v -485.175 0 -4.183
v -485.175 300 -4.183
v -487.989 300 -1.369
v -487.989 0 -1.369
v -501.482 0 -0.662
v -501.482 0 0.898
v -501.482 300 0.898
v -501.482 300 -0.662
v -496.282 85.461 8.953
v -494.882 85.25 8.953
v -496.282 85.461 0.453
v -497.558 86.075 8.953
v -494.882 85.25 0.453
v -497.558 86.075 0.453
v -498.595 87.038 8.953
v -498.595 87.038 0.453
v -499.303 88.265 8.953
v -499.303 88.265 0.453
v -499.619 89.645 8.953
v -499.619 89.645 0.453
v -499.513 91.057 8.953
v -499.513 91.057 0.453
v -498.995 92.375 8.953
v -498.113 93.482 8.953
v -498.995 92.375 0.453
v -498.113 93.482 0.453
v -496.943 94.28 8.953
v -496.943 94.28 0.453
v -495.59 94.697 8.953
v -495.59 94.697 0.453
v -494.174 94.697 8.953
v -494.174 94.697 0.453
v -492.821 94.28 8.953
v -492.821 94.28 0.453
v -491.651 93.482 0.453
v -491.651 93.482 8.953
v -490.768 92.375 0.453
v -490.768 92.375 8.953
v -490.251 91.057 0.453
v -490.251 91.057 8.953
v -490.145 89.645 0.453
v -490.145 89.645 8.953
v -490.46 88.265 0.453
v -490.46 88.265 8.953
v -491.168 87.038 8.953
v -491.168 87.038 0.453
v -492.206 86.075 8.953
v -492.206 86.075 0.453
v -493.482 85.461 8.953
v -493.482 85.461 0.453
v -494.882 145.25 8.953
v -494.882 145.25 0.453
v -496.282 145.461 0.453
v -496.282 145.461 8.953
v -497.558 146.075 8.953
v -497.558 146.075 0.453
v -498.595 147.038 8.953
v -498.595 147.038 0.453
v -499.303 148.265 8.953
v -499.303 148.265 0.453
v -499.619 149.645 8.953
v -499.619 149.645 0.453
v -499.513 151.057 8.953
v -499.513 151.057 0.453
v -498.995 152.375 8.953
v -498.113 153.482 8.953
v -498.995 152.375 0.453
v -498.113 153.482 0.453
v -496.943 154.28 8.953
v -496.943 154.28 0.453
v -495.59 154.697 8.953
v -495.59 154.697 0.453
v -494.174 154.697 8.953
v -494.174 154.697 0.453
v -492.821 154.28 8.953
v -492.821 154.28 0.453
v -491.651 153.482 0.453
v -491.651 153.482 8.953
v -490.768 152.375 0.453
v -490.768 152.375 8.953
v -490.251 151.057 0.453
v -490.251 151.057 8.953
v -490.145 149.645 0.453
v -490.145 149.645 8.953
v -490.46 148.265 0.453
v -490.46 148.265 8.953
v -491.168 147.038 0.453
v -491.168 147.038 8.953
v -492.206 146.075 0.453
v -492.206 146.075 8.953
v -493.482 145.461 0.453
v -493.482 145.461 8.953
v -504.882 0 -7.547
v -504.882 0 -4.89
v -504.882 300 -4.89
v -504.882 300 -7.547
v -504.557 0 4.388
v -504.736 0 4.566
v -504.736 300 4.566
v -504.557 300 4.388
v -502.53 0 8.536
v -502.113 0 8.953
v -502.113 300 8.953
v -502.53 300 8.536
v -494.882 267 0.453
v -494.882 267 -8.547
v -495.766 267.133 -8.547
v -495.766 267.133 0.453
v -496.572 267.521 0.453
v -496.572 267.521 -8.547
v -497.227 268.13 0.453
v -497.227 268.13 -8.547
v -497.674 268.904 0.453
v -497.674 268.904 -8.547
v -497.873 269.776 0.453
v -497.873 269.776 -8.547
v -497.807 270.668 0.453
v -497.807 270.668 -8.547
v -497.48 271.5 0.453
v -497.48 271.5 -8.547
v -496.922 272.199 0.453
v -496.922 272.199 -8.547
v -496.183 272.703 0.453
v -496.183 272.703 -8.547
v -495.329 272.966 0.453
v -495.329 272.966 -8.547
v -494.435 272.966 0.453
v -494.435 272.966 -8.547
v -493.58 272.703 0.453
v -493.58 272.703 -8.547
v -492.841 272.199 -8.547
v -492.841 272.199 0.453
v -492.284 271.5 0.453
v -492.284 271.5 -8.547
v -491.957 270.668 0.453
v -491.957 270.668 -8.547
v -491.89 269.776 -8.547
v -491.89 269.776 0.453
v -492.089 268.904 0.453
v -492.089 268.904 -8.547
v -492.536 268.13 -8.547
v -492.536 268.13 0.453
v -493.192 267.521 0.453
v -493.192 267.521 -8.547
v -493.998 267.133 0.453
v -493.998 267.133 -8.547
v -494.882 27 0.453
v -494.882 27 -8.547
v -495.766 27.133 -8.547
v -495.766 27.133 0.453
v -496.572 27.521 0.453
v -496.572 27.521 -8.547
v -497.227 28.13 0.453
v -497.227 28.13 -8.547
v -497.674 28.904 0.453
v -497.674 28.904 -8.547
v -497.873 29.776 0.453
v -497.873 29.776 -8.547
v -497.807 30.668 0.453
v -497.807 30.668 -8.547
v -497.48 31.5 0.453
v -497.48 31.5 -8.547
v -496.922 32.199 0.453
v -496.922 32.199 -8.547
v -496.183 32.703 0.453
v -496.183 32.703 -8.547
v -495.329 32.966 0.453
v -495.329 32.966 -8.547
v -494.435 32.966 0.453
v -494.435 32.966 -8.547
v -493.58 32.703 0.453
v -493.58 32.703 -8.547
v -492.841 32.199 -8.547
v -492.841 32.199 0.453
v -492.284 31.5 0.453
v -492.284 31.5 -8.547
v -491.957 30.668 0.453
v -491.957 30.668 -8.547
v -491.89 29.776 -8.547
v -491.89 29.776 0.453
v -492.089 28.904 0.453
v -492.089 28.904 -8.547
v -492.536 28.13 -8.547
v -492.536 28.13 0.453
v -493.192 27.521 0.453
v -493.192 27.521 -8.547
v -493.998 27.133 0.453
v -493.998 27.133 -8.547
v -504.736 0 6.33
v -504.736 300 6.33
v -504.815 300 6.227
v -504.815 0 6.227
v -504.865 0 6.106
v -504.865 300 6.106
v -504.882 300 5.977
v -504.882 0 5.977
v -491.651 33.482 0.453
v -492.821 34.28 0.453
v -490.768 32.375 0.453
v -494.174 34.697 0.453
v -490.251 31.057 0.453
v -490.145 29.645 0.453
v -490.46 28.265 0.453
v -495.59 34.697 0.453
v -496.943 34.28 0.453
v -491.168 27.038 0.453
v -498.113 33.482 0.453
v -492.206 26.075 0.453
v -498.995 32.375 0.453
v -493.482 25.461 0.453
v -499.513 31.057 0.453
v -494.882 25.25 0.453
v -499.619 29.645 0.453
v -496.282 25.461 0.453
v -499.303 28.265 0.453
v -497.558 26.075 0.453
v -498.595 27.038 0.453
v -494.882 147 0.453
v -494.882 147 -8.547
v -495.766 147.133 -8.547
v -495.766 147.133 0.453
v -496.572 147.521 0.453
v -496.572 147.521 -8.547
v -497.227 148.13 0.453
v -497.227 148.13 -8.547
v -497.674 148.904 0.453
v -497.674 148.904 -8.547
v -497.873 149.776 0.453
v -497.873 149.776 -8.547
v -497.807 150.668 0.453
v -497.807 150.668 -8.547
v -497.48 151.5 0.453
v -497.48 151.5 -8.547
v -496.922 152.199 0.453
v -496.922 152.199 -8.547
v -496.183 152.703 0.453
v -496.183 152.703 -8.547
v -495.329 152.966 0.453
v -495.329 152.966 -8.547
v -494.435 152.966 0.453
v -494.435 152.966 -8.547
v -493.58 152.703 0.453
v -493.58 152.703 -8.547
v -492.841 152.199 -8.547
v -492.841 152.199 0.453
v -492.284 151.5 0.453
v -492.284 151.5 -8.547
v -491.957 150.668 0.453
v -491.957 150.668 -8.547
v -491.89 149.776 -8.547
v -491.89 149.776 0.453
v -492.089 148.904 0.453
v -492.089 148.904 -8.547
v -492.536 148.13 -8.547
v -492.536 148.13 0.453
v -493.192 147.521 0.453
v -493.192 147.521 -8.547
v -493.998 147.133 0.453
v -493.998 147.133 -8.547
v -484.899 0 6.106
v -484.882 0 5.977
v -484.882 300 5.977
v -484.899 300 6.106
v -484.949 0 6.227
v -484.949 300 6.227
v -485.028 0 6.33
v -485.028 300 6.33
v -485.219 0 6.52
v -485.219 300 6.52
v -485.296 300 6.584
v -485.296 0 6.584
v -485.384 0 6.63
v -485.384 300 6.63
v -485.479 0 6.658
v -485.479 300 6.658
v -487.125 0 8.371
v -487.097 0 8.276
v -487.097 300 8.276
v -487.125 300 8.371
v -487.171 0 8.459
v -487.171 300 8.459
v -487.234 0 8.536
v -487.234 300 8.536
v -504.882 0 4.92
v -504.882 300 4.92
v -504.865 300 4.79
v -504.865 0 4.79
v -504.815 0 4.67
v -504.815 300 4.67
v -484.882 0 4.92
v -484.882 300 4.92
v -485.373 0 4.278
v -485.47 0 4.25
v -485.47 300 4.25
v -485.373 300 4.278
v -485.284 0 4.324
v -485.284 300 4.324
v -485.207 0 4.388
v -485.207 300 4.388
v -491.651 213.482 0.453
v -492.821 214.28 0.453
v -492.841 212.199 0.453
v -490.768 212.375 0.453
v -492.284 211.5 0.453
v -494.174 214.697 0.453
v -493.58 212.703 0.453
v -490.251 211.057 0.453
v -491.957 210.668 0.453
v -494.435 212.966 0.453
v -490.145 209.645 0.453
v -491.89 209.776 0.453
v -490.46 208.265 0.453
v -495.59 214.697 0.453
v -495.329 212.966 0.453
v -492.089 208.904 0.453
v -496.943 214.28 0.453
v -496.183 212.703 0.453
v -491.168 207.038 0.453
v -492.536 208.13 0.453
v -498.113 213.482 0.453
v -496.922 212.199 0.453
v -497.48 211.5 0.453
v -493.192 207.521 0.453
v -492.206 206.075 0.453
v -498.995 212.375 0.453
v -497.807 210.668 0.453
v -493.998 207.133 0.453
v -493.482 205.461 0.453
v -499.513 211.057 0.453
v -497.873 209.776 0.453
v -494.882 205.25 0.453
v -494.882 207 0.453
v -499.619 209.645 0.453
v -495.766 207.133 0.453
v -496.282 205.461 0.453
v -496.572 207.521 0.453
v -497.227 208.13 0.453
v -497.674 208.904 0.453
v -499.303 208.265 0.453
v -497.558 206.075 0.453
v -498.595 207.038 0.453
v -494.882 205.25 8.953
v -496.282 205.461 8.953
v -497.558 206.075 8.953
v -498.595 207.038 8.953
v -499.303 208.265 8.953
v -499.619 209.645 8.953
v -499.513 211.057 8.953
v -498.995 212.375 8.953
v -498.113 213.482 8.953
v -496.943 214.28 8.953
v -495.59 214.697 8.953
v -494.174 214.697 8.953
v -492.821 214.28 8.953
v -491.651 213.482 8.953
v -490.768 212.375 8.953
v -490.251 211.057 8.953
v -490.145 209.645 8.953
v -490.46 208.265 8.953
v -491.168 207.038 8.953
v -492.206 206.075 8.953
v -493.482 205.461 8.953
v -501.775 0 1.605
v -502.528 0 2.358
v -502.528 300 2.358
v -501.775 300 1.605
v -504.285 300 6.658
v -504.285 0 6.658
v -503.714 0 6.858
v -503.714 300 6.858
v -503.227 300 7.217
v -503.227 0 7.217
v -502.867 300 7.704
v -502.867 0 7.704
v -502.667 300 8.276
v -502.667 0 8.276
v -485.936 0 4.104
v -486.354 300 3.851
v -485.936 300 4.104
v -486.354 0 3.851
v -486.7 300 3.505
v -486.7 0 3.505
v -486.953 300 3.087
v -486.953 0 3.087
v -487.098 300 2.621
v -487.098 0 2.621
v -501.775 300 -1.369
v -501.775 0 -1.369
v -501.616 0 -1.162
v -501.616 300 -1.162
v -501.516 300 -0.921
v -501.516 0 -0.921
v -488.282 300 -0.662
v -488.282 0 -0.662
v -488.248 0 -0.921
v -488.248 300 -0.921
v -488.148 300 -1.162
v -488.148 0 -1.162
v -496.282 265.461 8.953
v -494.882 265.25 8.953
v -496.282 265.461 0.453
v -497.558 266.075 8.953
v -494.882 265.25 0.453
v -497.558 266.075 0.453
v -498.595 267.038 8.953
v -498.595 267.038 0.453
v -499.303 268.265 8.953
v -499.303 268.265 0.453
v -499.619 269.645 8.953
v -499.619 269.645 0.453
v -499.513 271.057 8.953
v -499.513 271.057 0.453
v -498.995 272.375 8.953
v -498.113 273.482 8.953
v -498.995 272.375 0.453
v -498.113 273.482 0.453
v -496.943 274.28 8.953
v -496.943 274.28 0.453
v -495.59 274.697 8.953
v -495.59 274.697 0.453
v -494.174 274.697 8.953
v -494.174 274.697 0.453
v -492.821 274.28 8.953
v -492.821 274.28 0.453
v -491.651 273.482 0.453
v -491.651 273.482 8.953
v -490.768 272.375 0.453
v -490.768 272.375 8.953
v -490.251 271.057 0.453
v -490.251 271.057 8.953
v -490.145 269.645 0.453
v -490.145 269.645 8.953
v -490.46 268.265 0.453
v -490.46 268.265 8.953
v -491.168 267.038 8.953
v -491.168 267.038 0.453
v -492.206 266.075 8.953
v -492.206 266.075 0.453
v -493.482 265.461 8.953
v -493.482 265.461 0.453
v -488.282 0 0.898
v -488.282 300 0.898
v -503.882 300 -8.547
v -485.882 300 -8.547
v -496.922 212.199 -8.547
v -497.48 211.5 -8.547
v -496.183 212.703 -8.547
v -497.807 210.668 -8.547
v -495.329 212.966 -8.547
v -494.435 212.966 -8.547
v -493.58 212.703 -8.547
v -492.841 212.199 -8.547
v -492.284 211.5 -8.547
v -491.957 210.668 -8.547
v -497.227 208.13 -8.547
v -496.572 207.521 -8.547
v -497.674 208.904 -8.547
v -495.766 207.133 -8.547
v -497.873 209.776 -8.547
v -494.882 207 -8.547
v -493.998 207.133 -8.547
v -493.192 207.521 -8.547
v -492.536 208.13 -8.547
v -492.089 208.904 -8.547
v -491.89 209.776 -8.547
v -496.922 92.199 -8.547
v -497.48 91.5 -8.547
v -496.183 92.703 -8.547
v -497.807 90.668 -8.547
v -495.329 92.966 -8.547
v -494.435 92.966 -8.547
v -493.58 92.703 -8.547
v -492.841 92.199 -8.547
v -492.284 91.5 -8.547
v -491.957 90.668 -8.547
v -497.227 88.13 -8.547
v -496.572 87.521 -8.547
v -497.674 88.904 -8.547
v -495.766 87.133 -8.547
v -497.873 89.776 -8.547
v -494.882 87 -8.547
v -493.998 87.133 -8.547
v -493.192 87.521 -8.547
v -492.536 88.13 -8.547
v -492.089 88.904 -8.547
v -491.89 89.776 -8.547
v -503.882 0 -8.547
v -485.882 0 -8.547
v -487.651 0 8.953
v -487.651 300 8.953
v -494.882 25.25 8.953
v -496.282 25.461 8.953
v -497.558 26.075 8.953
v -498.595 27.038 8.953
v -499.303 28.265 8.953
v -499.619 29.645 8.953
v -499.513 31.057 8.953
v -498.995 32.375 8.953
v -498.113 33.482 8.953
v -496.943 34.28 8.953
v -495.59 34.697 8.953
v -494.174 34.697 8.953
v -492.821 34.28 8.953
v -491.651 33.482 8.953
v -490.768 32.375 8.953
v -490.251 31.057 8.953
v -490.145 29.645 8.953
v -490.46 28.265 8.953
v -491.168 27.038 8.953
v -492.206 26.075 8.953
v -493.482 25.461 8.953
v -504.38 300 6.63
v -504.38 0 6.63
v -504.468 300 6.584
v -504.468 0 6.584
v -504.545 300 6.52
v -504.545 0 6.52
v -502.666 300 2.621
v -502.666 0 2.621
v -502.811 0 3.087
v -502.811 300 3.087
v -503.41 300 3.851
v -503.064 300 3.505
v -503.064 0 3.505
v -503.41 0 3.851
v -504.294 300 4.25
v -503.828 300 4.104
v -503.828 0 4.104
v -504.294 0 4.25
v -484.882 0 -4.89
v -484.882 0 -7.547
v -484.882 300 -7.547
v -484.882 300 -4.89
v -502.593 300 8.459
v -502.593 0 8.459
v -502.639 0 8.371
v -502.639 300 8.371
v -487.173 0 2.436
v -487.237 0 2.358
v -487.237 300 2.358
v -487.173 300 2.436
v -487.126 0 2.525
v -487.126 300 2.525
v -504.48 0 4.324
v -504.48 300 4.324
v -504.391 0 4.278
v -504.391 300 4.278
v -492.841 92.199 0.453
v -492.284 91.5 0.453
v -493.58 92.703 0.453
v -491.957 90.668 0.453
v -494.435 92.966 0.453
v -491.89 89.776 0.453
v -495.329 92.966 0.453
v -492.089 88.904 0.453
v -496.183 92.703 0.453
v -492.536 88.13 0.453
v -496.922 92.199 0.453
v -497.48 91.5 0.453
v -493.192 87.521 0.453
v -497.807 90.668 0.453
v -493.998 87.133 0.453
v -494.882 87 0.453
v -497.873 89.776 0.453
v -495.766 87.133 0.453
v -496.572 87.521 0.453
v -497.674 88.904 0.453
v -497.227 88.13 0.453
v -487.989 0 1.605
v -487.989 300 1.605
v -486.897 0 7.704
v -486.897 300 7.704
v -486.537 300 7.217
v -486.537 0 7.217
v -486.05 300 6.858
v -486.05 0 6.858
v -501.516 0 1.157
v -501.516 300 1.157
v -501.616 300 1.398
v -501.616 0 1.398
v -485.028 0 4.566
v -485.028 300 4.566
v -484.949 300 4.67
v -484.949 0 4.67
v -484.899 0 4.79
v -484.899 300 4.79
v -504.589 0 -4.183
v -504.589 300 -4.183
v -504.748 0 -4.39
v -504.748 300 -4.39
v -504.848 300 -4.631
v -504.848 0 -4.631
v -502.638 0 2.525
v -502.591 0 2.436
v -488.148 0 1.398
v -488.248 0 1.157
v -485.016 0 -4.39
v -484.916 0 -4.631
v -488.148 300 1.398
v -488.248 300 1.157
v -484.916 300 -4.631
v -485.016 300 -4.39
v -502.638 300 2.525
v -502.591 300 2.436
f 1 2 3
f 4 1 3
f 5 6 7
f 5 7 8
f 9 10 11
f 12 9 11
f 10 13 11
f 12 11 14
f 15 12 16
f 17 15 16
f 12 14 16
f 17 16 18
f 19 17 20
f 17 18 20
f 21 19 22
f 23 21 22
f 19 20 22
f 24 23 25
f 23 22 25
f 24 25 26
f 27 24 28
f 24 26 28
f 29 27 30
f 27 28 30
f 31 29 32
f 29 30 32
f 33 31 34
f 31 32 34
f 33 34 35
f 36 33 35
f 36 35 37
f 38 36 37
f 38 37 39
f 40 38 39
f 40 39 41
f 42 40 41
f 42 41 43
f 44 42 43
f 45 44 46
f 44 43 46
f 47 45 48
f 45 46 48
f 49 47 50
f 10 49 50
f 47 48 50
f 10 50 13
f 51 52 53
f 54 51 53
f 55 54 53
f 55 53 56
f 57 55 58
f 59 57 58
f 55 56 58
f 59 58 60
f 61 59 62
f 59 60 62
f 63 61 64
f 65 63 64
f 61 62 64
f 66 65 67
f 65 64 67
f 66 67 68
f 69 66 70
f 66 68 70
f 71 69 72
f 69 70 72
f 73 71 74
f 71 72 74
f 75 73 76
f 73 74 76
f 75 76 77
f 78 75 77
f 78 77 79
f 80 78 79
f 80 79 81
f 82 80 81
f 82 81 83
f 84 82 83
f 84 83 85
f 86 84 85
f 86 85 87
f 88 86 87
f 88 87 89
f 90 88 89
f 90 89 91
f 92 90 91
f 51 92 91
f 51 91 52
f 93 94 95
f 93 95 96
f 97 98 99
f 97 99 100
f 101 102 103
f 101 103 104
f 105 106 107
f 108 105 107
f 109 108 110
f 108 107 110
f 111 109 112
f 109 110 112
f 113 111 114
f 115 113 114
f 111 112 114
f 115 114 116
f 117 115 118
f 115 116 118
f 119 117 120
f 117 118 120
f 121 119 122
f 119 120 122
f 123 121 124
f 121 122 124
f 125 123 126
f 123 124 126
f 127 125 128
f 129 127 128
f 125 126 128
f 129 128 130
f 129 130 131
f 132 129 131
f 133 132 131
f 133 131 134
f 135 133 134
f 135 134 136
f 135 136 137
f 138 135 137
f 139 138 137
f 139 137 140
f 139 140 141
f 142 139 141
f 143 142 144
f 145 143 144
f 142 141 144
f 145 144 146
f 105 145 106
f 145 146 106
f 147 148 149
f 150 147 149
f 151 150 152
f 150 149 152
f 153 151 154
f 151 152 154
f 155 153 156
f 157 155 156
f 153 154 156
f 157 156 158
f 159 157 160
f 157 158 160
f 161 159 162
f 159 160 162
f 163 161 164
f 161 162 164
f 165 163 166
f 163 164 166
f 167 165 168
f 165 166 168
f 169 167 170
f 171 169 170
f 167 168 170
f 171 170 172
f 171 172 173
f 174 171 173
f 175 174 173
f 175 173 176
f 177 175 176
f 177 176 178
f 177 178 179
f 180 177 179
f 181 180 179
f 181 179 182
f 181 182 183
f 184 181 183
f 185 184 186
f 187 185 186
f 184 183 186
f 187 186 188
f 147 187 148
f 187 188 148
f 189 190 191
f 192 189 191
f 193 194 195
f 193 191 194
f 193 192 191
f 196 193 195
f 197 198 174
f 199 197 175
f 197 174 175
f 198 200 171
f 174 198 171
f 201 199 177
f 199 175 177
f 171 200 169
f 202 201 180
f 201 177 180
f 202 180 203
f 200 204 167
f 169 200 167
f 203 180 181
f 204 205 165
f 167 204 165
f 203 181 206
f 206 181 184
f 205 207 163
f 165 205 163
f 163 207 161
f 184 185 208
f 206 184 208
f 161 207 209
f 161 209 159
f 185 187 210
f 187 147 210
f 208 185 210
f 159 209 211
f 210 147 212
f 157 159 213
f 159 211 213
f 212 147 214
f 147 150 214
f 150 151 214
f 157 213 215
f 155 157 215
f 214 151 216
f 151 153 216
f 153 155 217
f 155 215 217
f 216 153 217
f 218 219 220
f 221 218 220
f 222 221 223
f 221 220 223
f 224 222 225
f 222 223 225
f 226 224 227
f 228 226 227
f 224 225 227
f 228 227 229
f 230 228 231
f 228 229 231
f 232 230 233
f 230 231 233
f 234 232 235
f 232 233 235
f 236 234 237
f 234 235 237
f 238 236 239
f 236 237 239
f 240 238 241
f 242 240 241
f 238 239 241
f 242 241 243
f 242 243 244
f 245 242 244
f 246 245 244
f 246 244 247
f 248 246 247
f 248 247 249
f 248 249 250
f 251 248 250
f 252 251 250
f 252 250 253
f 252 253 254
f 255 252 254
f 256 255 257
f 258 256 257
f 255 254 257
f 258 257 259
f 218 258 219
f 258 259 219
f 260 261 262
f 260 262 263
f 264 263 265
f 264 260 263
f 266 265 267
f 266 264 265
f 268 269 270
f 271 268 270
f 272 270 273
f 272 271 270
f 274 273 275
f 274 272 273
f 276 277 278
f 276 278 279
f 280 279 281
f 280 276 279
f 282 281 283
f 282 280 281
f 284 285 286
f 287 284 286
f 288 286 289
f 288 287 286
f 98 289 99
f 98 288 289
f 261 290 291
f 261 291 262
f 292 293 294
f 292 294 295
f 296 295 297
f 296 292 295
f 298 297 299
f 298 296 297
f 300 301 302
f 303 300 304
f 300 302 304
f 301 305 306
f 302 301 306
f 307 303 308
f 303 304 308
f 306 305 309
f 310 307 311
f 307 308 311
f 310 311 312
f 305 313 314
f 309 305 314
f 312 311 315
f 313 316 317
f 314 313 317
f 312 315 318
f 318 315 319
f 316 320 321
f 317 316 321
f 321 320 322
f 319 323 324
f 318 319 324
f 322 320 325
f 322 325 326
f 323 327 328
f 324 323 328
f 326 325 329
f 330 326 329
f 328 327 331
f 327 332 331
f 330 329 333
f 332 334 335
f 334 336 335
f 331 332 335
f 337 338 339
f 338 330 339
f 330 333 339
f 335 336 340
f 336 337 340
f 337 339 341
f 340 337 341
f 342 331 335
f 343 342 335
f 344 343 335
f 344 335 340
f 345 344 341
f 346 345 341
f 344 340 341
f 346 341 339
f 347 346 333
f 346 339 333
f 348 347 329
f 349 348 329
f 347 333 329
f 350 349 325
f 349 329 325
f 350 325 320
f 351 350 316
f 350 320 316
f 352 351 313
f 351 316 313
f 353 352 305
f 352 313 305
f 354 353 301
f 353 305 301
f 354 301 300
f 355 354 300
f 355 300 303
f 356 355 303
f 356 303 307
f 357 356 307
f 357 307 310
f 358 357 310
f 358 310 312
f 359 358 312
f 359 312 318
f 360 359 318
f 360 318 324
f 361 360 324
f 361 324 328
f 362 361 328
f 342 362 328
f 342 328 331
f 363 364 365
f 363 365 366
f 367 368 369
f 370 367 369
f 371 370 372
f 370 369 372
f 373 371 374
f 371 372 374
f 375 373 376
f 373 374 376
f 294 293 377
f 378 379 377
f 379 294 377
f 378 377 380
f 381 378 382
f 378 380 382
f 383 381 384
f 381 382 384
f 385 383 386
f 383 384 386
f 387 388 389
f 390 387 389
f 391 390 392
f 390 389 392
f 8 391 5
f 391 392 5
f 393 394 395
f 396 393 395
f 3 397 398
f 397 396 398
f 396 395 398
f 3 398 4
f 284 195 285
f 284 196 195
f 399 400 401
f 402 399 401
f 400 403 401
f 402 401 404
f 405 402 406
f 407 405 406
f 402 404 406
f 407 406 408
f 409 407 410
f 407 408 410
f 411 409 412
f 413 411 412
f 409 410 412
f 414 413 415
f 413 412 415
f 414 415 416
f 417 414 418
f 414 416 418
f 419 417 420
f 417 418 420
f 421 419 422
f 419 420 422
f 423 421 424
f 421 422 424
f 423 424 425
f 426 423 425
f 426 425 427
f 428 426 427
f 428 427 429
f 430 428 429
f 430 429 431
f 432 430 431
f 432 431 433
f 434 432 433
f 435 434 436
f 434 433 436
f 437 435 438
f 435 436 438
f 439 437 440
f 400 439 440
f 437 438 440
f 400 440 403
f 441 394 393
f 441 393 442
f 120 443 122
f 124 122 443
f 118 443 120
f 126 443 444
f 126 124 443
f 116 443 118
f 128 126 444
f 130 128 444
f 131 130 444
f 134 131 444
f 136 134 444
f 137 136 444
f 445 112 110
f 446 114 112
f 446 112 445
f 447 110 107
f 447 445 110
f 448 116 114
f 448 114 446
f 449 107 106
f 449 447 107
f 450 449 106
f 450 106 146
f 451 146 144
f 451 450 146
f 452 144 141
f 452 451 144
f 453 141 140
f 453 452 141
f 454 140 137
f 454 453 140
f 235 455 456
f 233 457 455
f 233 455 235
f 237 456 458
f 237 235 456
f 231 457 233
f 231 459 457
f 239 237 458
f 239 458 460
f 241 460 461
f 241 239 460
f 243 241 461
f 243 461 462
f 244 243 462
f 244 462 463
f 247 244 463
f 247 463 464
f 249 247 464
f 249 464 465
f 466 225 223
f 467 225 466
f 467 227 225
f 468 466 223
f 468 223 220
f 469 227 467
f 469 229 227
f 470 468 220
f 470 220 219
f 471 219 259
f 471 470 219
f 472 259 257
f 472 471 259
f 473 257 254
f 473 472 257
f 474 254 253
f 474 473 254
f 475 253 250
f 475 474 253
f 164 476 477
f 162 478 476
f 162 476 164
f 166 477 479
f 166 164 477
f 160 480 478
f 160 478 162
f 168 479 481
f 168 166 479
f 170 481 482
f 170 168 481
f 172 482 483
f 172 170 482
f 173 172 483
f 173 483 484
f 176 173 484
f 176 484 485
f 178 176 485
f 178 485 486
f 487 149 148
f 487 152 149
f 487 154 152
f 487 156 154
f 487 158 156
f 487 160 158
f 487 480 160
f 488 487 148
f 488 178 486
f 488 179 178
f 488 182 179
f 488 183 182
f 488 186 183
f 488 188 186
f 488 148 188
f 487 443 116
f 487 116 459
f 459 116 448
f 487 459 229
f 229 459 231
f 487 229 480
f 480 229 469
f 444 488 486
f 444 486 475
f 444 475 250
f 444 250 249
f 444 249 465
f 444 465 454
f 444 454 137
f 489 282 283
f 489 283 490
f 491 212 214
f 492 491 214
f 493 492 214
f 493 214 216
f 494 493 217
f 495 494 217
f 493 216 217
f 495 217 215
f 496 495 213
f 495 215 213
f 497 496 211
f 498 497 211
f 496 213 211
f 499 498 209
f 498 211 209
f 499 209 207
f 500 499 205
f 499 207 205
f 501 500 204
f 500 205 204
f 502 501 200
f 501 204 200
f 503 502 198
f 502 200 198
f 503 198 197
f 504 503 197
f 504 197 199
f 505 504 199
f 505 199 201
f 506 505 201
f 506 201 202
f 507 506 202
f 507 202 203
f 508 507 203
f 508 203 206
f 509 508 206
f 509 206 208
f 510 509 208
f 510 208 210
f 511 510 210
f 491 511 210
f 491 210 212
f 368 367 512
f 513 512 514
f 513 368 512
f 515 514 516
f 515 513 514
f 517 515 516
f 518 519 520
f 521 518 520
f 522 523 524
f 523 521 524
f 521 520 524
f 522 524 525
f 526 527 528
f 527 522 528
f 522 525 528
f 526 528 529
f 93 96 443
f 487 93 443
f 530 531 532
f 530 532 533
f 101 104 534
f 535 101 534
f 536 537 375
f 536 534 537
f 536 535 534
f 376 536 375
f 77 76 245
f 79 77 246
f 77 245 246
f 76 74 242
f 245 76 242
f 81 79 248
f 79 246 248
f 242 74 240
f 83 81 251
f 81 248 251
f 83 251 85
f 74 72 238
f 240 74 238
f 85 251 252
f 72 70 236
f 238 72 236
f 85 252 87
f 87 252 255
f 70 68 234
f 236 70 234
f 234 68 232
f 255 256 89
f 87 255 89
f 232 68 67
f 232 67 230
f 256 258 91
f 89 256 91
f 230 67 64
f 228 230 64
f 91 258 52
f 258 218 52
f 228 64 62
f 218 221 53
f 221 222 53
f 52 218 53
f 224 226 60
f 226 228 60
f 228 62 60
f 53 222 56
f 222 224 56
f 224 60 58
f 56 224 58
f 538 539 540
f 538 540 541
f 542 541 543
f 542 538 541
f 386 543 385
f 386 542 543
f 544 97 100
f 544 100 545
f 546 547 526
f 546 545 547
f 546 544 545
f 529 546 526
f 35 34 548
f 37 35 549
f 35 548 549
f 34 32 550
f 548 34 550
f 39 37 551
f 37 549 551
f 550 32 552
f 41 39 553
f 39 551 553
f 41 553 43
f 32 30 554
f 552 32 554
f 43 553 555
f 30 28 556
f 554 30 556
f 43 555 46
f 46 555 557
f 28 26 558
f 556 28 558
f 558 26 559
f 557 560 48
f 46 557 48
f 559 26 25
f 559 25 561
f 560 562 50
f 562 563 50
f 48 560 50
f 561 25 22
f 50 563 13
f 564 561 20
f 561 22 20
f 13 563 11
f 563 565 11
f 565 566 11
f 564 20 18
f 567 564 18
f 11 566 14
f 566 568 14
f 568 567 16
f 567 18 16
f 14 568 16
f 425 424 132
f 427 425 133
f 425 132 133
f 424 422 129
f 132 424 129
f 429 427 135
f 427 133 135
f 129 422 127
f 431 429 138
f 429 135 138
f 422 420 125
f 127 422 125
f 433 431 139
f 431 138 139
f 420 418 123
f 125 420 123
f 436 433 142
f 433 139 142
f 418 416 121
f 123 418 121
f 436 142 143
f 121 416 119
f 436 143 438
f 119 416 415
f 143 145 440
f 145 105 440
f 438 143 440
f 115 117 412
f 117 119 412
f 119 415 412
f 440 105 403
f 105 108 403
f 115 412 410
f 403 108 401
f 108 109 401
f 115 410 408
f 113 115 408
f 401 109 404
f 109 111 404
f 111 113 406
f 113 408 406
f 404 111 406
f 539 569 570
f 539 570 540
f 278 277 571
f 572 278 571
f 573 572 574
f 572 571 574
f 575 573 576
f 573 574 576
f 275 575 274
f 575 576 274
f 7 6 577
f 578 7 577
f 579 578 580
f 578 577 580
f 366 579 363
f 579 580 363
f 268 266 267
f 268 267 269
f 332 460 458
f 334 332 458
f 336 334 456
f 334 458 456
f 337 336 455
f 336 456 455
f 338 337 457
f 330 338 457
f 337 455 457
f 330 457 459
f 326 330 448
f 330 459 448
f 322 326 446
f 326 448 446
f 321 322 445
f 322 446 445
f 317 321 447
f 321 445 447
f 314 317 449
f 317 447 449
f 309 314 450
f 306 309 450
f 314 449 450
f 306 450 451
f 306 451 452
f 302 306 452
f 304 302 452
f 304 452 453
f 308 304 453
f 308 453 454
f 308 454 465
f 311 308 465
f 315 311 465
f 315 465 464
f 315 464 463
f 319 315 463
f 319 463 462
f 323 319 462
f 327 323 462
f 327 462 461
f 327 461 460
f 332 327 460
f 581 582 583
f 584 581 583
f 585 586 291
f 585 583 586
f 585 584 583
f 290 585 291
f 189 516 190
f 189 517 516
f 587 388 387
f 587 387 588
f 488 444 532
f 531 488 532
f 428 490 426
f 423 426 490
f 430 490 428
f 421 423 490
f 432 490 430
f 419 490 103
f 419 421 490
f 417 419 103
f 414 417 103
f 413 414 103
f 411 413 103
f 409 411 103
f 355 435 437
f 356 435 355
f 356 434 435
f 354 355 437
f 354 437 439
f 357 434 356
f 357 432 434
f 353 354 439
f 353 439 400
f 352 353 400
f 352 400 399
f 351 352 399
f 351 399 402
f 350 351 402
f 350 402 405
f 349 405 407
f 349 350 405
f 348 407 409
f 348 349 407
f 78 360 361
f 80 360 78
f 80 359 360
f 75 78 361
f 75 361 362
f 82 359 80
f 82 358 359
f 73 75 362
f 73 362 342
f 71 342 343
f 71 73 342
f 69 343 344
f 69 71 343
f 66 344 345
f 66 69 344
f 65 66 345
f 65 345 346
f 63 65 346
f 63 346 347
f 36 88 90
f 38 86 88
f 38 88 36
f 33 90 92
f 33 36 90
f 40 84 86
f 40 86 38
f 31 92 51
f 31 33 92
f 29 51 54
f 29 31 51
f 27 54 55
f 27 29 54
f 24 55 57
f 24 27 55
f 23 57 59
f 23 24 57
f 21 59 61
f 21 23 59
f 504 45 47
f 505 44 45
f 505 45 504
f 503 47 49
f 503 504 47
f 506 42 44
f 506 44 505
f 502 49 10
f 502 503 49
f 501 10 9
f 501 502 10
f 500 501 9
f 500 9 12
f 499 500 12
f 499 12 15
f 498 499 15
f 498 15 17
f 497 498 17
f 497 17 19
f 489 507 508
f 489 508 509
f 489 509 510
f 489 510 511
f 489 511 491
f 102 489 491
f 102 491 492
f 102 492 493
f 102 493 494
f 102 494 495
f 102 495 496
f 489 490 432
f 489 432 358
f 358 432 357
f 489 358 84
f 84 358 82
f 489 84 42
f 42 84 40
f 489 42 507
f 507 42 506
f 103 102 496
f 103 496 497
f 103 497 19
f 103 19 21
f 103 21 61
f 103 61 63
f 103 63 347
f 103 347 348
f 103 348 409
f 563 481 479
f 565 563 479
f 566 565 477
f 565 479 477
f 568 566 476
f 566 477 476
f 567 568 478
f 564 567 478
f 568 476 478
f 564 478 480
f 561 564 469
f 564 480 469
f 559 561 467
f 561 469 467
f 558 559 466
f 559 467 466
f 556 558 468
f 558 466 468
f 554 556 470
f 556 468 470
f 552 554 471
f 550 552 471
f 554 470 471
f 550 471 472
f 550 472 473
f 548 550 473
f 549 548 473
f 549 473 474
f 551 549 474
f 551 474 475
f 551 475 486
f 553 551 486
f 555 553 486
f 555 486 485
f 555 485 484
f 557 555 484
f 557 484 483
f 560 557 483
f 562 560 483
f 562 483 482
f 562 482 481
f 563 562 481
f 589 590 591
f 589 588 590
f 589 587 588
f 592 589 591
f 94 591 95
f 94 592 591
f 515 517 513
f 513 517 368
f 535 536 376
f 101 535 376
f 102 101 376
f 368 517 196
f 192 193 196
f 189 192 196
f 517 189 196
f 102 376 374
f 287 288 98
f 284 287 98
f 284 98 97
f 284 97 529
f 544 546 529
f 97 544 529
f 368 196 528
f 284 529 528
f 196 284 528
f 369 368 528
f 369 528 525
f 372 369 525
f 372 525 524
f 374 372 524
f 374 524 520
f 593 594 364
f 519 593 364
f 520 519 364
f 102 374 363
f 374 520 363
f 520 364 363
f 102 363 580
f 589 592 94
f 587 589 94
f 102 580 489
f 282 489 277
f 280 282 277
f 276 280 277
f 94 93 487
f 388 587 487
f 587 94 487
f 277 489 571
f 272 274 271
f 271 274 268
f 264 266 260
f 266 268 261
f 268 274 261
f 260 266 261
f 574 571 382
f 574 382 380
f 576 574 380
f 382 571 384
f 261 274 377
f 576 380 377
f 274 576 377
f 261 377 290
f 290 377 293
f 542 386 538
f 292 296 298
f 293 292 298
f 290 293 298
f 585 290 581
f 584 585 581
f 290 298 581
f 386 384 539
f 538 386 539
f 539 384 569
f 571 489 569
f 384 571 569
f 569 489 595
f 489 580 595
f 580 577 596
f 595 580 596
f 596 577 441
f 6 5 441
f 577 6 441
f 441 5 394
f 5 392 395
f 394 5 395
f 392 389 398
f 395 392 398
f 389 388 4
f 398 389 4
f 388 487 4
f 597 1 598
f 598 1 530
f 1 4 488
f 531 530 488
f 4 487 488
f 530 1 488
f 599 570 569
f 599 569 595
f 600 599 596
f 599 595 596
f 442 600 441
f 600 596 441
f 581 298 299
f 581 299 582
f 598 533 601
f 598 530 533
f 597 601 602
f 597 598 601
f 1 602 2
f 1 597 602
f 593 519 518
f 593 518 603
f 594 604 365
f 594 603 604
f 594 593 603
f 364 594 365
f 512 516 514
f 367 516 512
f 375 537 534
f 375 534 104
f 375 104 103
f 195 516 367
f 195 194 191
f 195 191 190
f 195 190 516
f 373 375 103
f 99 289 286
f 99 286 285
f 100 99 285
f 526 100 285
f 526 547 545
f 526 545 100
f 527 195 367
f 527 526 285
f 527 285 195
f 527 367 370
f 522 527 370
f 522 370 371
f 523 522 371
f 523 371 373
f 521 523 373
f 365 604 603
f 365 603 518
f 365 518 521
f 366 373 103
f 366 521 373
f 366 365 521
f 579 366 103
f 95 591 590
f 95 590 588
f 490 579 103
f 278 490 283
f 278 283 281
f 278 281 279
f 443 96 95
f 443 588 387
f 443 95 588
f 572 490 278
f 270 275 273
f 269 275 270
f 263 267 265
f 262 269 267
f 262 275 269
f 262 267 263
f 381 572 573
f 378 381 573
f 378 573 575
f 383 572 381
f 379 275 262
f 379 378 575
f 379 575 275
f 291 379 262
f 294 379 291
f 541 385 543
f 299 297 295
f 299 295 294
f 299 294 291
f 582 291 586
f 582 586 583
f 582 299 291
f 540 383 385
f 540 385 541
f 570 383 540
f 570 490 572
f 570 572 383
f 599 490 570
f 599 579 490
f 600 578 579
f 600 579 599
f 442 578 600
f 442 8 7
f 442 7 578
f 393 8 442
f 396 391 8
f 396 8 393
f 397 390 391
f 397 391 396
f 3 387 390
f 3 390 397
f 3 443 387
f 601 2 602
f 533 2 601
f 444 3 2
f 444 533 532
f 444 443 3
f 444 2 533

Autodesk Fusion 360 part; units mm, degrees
sketch "Sketch2" plane through (0, 0, 0) normal (0, 1, 0) x (1, 0, 0)
  line L0 (-504.5454, -6.5205) -> (-504.7356, -6.3303)
  arc A0 (-504.882, -5.9768) -> (-504.7356, -6.3303) centre (-504.382, -5.9768) ccw
  line L1 (-504.882, -5.9768) -> (-504.882, -4.9195)
  arc A1 (-504.7356, -4.566) -> (-504.882, -4.9195) centre (-504.382, -4.9195) ccw
  line L2 (-504.7356, -4.566) -> (-504.5574, -4.3878)
  arc A2 (-504.2944, -4.2496) -> (-504.5574, -4.3878) centre (-504.2038, -4.7413) ccw
  arc A3 (-504.2944, -4.2496) -> (-502.6657, -2.6209) centre (-504.6621, -2.2532) ccw
  arc A4 (-502.5275, -2.3579) -> (-502.6657, -2.6209) centre (-502.1739, -2.7114) ccw
  line L3 (-502.5275, -2.3579) -> (-501.7749, -1.6053)
  arc A5 (-501.7749, -1.6053) -> (-501.482, -0.8982) centre (-502.482, -0.8982) ccw
  line L4 (-501.482, -0.8982) -> (-501.482, 0.6619)
  arc A6 (-501.482, 0.6619) -> (-501.7749, 1.369) centre (-502.482, 0.6619) ccw
  line L5 (-501.7749, 1.369) -> (-504.5891, 4.1832)
  arc A7 (-504.882, 4.8903) -> (-504.5891, 4.1832) centre (-503.882, 4.8903) ccw
  line L6 (-504.882, 4.8903) -> (-504.882, 7.5468)
  line L7 (-504.882, 7.5468) -> (-503.882, 8.5468)
  line L8 (-503.882, 8.5468) -> (-485.882, 8.5468)
  line L9 (-485.882, 8.5468) -> (-484.882, 7.5468)
  line L10 (-484.882, 7.5468) -> (-484.882, 4.8903)
  arc A8 (-485.1749, 4.1832) -> (-484.882, 4.8903) centre (-485.882, 4.8903) ccw
  line L11 (-485.1749, 4.1832) -> (-487.9891, 1.369)
  arc A9 (-487.9891, 1.369) -> (-488.282, 0.6619) centre (-487.282, 0.6619) ccw
  line L12 (-488.282, 0.6619) -> (-488.282, -0.8982)
  arc A10 (-488.282, -0.8982) -> (-487.9891, -1.6053) centre (-487.282, -0.8982) ccw
  line L13 (-487.9891, -1.6053) -> (-487.2366, -2.3579)
  arc A11 (-487.0984, -2.6209) -> (-487.2366, -2.3579) centre (-487.5902, -2.7114) ccw
  arc A12 (-487.0984, -2.6209) -> (-485.4697, -4.2496) centre (-485.102, -2.2532) ccw
  arc A13 (-485.2067, -4.3878) -> (-485.4697, -4.2496) centre (-485.5603, -4.7413) ccw
  line L14 (-485.2067, -4.3878) -> (-485.0285, -4.566)
  arc A14 (-484.882, -4.9195) -> (-485.0285, -4.566) centre (-485.382, -4.9195) ccw
  line L15 (-484.882, -4.9195) -> (-484.882, -5.9768)
  arc A15 (-485.0285, -6.3303) -> (-484.882, -5.9768) centre (-485.382, -5.9768) ccw
  line L16 (-485.0285, -6.3303) -> (-485.2187, -6.5205)
  arc A16 (-485.4793, -6.6583) -> (-485.2187, -6.5205) centre (-485.5722, -6.167) ccw
  arc A17 (-485.4793, -6.6583) -> (-487.0966, -8.2756) centre (-485.102, -8.6529) ccw
  arc A18 (-487.2344, -8.5362) -> (-487.0966, -8.2756) centre (-487.5879, -8.1826) ccw
  line L17 (-487.2344, -8.5362) -> (-487.6513, -8.9532)
  line L18 (-487.6513, -8.9532) -> (-502.1128, -8.9532)
  line L19 (-502.1128, -8.9532) -> (-502.5297, -8.5362)
  arc A19 (-502.6674, -8.2756) -> (-502.5297, -8.5362) centre (-502.1762, -8.1826) ccw
  arc A20 (-502.6674, -8.2756) -> (-504.2848, -6.6583) centre (-504.6621, -8.6529) ccw
  arc A21 (-504.5454, -6.5205) -> (-504.2848, -6.6583) centre (-504.1918, -6.167) ccw
extrude "Extrude2" add sketch "Sketch2" along normal blind 300
hole "Hole2" at (-494.8818, 30, 8.9532) direction (0, 0, -1) diameter 6 depth 17.5 tip angle 118 counterbore diameter 9.5 counterbore depth 8.5
pattern_linear "R-Pattern2" count 5 spacing 60 along (0, 1, 0) of "Hole2"
equation "RailLength = 300 mm"
equation "RailHoleSpacing = 60 mm"
equation "RailNumberOfHoles = round(RailLength / RailHoleSpacing)"
equation "RailFirstHoleOffset = ( RailLength - ( ( RailNumberOfHoles - 1 ) * RailHoleSpacing ) ) / 2"
equation "d18 = RailLength"
equation "d25 = RailFirstHoleOffset"
equation "d27 = RailNumberOfHoles"
equation "d29 = RailHoleSpacing"
